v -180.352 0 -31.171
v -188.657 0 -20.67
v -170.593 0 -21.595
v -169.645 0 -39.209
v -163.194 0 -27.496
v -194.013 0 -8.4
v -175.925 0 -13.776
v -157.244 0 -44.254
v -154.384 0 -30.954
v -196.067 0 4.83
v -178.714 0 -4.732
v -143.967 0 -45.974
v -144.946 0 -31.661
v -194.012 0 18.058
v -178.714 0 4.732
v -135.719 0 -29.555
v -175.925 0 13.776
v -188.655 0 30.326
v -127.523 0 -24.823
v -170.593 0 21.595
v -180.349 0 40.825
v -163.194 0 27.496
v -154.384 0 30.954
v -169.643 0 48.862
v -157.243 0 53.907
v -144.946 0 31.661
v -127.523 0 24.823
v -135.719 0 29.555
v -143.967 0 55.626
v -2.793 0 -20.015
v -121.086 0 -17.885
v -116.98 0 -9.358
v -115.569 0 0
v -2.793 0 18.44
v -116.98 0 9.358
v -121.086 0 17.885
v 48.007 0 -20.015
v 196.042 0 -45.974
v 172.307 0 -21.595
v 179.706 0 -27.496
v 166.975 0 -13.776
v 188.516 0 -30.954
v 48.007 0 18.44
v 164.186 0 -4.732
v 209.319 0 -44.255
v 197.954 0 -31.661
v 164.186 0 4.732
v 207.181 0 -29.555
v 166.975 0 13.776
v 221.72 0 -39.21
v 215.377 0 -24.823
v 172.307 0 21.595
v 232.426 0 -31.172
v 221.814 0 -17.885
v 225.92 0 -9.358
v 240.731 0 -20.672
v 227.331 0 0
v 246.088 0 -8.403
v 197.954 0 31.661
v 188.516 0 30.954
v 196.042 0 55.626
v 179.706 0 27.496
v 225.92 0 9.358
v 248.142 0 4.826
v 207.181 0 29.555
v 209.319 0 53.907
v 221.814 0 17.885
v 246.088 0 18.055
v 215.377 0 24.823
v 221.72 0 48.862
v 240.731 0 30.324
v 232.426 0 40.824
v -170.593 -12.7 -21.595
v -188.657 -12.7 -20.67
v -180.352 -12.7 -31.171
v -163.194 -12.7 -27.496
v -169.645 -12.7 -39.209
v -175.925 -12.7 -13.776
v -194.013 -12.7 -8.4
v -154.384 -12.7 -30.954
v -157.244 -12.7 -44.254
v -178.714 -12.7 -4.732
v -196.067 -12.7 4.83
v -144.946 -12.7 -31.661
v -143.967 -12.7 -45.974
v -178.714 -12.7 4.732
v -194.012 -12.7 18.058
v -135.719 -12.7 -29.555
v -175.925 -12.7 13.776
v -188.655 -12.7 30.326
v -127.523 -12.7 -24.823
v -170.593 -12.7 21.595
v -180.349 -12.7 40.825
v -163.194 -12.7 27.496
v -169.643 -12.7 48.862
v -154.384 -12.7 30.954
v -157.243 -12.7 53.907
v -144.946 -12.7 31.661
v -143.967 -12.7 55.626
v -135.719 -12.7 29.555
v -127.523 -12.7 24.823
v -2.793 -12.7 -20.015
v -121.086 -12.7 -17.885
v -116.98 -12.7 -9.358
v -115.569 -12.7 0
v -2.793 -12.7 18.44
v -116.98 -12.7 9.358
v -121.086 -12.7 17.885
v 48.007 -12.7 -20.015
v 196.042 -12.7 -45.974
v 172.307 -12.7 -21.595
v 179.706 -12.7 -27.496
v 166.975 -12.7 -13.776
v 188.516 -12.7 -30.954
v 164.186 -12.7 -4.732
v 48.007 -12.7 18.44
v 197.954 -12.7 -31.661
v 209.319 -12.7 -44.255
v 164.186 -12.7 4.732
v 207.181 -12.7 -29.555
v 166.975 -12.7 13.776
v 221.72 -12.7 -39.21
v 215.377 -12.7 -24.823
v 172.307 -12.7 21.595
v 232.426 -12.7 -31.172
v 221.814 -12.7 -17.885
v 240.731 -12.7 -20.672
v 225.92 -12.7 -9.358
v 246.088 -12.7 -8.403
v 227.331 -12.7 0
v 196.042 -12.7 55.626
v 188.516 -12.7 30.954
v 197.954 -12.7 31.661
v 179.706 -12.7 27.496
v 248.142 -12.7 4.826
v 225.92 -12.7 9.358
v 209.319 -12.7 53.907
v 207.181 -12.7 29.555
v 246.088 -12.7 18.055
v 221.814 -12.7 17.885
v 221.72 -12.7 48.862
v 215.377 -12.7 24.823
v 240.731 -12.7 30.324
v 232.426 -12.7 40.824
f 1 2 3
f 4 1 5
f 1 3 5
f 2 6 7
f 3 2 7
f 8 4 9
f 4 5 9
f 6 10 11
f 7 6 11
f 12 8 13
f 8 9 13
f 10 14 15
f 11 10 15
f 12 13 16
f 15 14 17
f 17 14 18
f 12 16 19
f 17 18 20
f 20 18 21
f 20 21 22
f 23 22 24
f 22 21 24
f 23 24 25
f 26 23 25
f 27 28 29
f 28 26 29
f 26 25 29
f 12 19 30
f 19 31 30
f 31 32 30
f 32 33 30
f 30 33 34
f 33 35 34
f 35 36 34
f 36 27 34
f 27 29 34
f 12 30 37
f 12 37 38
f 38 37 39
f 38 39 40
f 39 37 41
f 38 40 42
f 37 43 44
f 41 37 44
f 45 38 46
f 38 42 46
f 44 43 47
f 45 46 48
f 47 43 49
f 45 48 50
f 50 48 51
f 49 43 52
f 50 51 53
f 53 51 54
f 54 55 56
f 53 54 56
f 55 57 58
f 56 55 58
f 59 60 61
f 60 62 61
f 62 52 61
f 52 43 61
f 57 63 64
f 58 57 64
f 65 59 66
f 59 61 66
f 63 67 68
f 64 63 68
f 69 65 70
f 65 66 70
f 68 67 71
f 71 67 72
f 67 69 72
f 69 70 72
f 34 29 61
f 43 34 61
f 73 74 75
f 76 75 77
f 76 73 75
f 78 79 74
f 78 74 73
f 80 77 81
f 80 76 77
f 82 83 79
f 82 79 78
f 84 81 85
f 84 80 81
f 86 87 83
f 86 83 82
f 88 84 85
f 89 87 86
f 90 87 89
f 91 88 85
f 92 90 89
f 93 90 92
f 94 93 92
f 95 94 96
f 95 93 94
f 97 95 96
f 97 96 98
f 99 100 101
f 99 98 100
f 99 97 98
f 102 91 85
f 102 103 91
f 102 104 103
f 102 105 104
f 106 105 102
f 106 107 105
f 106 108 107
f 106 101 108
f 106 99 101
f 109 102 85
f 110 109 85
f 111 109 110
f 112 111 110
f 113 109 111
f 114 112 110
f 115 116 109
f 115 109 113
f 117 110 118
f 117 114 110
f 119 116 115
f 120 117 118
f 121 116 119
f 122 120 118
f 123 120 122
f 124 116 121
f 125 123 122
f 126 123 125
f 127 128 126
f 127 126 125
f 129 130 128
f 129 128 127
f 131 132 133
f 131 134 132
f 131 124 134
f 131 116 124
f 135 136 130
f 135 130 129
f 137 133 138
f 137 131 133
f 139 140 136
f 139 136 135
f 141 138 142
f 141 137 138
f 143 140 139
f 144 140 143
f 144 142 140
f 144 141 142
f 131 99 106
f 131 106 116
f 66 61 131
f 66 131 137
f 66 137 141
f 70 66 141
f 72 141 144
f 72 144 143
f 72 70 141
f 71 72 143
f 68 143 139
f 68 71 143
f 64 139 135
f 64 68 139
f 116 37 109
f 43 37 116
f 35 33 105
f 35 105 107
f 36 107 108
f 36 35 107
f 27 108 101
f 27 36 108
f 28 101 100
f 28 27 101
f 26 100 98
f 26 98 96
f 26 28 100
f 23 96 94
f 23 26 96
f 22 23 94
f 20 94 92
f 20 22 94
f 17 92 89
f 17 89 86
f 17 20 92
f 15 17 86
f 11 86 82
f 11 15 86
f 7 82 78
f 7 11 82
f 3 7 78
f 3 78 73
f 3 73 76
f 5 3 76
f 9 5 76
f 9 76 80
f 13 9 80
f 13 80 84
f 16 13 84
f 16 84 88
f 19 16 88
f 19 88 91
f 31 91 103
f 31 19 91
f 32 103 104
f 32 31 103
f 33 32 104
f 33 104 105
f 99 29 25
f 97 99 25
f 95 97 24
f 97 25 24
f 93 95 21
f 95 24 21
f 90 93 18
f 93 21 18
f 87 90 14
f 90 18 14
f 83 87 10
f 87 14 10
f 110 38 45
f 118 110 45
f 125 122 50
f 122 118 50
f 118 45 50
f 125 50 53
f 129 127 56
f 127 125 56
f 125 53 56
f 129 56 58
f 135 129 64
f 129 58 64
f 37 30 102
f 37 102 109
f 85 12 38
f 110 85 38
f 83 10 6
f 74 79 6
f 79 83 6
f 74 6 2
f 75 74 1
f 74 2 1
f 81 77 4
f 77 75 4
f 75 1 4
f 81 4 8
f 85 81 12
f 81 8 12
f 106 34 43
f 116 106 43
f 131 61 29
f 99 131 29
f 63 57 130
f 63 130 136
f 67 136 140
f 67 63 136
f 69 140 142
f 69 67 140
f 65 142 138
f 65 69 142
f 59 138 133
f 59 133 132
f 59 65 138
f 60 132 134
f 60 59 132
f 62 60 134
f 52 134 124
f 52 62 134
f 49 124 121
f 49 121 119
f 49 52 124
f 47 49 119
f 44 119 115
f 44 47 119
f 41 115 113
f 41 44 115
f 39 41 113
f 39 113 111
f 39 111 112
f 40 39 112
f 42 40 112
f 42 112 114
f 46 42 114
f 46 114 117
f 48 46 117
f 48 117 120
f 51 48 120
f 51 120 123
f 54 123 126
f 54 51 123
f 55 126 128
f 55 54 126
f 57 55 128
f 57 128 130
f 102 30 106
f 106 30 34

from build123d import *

# Parameters (mm, degrees)
F0_R        = 31.75
F0_W        = 50.8
F0_H        = 38.4544562548
F1_DEPTH    = 12.7
F2_T1_DEPTH = 273.2826573419
F2_T3_DEPTH = 273.264091489
F2_T5_DEPTH = 273.3012245177


# Not quite as in the source:
# - a fillet or chamfer that OpenCascade refuses, or shapes differently, is made with other operations: its cross-section is extruded or revolved along the edge and cut away or added


with BuildPart() as f1:
    # F0 (on Front) → F1 (new body)
    with BuildSketch(Plane.XZ):
        Polygon((248.1590109615, 55.626), (-196.0797500385, 55.626), (-196.0869890385, -45.974), (248.1590109615, -45.974), align=None)
        with Locations((-147.3189890385, 0)):
            Circle(F0_R, mode=Mode.SUBTRACT)
        with Locations((22.6070109615, -0.7874006405)):
            Rectangle(F0_W, F0_H, mode=Mode.SUBTRACT)
        with Locations((195.5810109615, 0)):
            Circle(F0_R, mode=Mode.SUBTRACT)
    extrude(amount=F1_DEPTH)

    # F2: fillet of radius 52.1165314684 on 4 edges, made by hand

    # F2_s2 → F2_t1 (cut)
    with BuildSketch(Plane.XZ.offset(-130.291328671)):
        with BuildLine():
            ThreePointArc((196.0424794931, 55.626), (232.8944323064, 40.3614213448), (248.1590109615, 3.5094685316))
            Line((248.1590109615, 3.5094685316), (248.1590109615, 55.626))
            Line((248.1590109615, 55.626), (196.0424794931, 55.626))
        make_face()
        with BuildLine():
            ThreePointArc((196.0424794931, -45.974), (232.8944323064, -30.7094213448), (248.1590109615, 6.1425314684))
            Line((248.1590109615, 6.1425314684), (248.1590109615, -45.974))
            Line((248.1590109615, -45.974), (196.0424794931, -45.974))
        make_face()
    extrude(amount=F2_T1_DEPTH, mode=Mode.SUBTRACT)

    # F2_s4 → F2_t3 (cut)
    with BuildSketch(Plane.XZ.offset(-130.2820457445)):
        with BuildLine():
            ThreePointArc((-143.9669317407, 55.626), (-180.8175716797, 40.3627341723), (-196.0834630768, 3.5131818345))
            Line((-196.0834630768, 3.5131818345), (-196.0797500385, 55.626))
            Line((-196.0797500385, 55.626), (-143.9669317407, 55.626))
        make_face()
    extrude(amount=F2_T3_DEPTH, mode=Mode.SUBTRACT)

    # F2_s6 → F2_t5 (cut)
    with BuildSketch(Plane.XZ.offset(-130.3006122588)):
        with BuildLine():
            ThreePointArc((-196.083275471, 6.1462447712), (-180.8200097756, -30.7081084706), (-143.9667441349, -45.974))
            Line((-143.9667441349, -45.974), (-196.0869890385, -45.974))
            Line((-196.0869890385, -45.974), (-196.083275471, 6.1462447712))
        make_face()
    extrude(amount=F2_T5_DEPTH, mode=Mode.SUBTRACT)


solid = f1.part
